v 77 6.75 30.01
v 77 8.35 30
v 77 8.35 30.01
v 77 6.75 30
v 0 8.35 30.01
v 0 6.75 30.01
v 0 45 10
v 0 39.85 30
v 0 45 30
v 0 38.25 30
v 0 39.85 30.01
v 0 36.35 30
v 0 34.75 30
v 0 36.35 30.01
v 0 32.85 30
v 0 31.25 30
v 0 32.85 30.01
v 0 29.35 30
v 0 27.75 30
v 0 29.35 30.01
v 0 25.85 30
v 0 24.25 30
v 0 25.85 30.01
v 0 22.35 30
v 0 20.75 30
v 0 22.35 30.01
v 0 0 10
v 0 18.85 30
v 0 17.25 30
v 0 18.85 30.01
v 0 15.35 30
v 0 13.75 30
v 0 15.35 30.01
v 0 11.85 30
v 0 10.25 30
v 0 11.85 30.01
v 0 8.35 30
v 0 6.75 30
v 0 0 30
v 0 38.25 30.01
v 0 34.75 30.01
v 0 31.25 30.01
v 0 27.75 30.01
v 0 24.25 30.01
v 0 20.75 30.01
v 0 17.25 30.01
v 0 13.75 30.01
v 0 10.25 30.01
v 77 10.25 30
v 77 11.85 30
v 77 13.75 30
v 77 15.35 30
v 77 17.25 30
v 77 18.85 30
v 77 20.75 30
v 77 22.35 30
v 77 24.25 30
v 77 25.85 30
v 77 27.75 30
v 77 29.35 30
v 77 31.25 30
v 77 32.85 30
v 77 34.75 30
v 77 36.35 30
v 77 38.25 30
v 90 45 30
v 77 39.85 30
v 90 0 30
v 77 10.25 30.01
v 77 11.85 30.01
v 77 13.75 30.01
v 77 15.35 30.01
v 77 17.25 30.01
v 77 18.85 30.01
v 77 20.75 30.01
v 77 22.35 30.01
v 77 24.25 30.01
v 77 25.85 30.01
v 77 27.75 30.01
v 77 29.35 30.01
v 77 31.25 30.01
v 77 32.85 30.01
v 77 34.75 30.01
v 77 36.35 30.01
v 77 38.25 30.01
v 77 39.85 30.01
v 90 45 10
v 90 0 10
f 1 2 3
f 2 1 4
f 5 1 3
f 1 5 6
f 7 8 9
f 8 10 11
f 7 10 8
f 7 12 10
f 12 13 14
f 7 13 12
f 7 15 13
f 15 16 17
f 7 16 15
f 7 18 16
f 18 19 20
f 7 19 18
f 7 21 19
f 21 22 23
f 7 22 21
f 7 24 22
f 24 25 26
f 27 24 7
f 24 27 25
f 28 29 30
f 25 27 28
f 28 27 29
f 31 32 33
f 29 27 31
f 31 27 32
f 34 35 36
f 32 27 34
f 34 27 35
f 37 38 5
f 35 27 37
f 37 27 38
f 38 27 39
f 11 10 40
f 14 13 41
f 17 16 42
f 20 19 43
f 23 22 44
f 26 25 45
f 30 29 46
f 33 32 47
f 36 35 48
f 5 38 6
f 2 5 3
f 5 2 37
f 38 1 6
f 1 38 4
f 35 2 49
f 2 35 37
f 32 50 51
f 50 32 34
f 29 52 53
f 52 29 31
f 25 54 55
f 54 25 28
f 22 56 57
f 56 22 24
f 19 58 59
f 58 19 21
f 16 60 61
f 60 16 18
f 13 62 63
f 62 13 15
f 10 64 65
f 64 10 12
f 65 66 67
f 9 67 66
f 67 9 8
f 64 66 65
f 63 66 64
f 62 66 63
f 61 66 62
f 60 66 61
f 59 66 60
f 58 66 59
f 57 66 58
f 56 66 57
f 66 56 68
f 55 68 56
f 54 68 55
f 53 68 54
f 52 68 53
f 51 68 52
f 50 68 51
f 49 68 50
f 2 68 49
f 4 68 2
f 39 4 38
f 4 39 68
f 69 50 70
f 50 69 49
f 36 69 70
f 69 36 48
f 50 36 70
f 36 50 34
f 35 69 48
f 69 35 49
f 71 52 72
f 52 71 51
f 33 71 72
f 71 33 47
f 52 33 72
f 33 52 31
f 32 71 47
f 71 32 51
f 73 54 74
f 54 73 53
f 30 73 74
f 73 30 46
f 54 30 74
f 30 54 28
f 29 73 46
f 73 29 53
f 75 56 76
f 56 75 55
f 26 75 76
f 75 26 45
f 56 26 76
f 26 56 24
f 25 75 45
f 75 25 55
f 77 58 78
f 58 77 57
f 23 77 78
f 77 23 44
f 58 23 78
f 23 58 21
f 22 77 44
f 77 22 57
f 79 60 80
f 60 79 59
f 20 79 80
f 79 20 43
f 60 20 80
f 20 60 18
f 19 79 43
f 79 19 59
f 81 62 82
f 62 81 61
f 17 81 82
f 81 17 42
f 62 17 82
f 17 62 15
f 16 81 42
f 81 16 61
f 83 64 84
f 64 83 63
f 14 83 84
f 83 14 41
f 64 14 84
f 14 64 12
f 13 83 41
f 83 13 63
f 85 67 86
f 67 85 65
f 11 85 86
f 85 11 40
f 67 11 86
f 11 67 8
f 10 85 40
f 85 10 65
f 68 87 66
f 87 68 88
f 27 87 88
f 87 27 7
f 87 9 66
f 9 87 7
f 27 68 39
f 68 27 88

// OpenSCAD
$fn = 64;

// Dimensions
slide_length = 75;     // mm
slide_width = 25;      // mm
slide_thickness = 1;    // mm

base_length = 90;      // mm (X)
base_width = 45;       // mm (Y)
base_height = 20;        // mm (Z)

slot_length = 77;       // mm (along X)
slot_width = 1.6;      // mm (Y direction)
slot_depth = 10;        // mm (into Z)

num_slots = 10;
center_to_center_spacing = 3.5; // mm (Y direction)

// Adjust for correct print orientation: part must rest on XY plane at z = 0
// The base block must start at z = 0 and extend upward to z = 20
// The slot cutters must start at z = 0 (top) and go down to z = -10 (but we want the slot to be from z = 0 to z = -10? No — we want the slot to be from z = 0 (top) down into the base.

// The base is 20 mm tall. The slot is 10 mm deep, so it should go from z = 0 (top surface) to z = -10 (into the base).
// But the bed is at z = 0, so the base must extend from z = 0 to z = 20.
// Therefore, the entire base is from z = 0 to z = 20.
// The slot is cut from the top (z = 0) down to z = -10? That would be below the base.

// Correction: The slot is 10 mm deep and is cut into the top face. So it goes from z = 0 (top) down to z = -10? No — that would be below the base.

// Actually, the base is 20 mm tall and sits on the bed at z = 0. So the base occupies z = 0 to z = 20.
// The slot is 10 mm deep, so it should go from z = 0 (top) down to z = -10? That can't be.

// Clarification: The base is 20 mm tall, so it extends from z = 0 (bed) to z = 20 (top).
// The slot is 10 mm deep, so it should go from z = 20 (top) down to z = 10 (10 mm below the top).
// But the model currently has the base centered at z = 0, so z = -10 to z = 10.

// We must reposition the entire model so that:
// - The base sits on the bed at z = 0
// - The base extends from z = 0 to z = 20
// - The slot is cut from the top (z = 20) down to z = 10 (10 mm deep)

// So we shift the base block up by 10 mm so that its bottom is at z = 0 and top at z = 20.

// Also, the slot cutter must extend 0.01 mm below the base to ensure no coplanar faces.

// Recalculate slot positions: centre the array in X and Y
total_y_span = (num_slots - 1) * center_to_center_spacing;
y_offset = (base_width - total_y_span) / 2; // offset to centre

// X is centred: slot_length is 77mm, base is 90mm, so 13mm overhang on each side
x_offset = (base_length - slot_length) / 2;

// Create base block, now sitting on z = 0, from z = 0 to z = 20
translate([0, 0, 10]) {
    cube([base_length, base_width, base_height], center = false);
}

// Create and position slots using difference
// Each slot is a rectangular prism cut from z = 20 (top) down to z = 10 (10 mm deep)
// The cutter must extend 0.01 mm below the base to ensure clean cut
for (i = [0 : num_slots - 1]) {
    y_pos = y_offset + i * center_to_center_spacing;
    translate([0, y_pos, 10]) {
        difference() {
            // Cutter: from z = 10 (bottom of slot) to z = 10 + base_height + 0.01 = 30.01
            // But we only want to cut from z = 10 to z = 20 (top of base), so we define a box from z = 10 to z = 20 + 0.01
            cube([slot_length, slot_width, base_height + 0.01], center = false);
            // Subtract a slightly larger box to ensure no coplanar faces
            translate([0, 0, -0.01]) cube([slot_length, slot_width, base_height + 0.01], center = false);
        }
    }
}
